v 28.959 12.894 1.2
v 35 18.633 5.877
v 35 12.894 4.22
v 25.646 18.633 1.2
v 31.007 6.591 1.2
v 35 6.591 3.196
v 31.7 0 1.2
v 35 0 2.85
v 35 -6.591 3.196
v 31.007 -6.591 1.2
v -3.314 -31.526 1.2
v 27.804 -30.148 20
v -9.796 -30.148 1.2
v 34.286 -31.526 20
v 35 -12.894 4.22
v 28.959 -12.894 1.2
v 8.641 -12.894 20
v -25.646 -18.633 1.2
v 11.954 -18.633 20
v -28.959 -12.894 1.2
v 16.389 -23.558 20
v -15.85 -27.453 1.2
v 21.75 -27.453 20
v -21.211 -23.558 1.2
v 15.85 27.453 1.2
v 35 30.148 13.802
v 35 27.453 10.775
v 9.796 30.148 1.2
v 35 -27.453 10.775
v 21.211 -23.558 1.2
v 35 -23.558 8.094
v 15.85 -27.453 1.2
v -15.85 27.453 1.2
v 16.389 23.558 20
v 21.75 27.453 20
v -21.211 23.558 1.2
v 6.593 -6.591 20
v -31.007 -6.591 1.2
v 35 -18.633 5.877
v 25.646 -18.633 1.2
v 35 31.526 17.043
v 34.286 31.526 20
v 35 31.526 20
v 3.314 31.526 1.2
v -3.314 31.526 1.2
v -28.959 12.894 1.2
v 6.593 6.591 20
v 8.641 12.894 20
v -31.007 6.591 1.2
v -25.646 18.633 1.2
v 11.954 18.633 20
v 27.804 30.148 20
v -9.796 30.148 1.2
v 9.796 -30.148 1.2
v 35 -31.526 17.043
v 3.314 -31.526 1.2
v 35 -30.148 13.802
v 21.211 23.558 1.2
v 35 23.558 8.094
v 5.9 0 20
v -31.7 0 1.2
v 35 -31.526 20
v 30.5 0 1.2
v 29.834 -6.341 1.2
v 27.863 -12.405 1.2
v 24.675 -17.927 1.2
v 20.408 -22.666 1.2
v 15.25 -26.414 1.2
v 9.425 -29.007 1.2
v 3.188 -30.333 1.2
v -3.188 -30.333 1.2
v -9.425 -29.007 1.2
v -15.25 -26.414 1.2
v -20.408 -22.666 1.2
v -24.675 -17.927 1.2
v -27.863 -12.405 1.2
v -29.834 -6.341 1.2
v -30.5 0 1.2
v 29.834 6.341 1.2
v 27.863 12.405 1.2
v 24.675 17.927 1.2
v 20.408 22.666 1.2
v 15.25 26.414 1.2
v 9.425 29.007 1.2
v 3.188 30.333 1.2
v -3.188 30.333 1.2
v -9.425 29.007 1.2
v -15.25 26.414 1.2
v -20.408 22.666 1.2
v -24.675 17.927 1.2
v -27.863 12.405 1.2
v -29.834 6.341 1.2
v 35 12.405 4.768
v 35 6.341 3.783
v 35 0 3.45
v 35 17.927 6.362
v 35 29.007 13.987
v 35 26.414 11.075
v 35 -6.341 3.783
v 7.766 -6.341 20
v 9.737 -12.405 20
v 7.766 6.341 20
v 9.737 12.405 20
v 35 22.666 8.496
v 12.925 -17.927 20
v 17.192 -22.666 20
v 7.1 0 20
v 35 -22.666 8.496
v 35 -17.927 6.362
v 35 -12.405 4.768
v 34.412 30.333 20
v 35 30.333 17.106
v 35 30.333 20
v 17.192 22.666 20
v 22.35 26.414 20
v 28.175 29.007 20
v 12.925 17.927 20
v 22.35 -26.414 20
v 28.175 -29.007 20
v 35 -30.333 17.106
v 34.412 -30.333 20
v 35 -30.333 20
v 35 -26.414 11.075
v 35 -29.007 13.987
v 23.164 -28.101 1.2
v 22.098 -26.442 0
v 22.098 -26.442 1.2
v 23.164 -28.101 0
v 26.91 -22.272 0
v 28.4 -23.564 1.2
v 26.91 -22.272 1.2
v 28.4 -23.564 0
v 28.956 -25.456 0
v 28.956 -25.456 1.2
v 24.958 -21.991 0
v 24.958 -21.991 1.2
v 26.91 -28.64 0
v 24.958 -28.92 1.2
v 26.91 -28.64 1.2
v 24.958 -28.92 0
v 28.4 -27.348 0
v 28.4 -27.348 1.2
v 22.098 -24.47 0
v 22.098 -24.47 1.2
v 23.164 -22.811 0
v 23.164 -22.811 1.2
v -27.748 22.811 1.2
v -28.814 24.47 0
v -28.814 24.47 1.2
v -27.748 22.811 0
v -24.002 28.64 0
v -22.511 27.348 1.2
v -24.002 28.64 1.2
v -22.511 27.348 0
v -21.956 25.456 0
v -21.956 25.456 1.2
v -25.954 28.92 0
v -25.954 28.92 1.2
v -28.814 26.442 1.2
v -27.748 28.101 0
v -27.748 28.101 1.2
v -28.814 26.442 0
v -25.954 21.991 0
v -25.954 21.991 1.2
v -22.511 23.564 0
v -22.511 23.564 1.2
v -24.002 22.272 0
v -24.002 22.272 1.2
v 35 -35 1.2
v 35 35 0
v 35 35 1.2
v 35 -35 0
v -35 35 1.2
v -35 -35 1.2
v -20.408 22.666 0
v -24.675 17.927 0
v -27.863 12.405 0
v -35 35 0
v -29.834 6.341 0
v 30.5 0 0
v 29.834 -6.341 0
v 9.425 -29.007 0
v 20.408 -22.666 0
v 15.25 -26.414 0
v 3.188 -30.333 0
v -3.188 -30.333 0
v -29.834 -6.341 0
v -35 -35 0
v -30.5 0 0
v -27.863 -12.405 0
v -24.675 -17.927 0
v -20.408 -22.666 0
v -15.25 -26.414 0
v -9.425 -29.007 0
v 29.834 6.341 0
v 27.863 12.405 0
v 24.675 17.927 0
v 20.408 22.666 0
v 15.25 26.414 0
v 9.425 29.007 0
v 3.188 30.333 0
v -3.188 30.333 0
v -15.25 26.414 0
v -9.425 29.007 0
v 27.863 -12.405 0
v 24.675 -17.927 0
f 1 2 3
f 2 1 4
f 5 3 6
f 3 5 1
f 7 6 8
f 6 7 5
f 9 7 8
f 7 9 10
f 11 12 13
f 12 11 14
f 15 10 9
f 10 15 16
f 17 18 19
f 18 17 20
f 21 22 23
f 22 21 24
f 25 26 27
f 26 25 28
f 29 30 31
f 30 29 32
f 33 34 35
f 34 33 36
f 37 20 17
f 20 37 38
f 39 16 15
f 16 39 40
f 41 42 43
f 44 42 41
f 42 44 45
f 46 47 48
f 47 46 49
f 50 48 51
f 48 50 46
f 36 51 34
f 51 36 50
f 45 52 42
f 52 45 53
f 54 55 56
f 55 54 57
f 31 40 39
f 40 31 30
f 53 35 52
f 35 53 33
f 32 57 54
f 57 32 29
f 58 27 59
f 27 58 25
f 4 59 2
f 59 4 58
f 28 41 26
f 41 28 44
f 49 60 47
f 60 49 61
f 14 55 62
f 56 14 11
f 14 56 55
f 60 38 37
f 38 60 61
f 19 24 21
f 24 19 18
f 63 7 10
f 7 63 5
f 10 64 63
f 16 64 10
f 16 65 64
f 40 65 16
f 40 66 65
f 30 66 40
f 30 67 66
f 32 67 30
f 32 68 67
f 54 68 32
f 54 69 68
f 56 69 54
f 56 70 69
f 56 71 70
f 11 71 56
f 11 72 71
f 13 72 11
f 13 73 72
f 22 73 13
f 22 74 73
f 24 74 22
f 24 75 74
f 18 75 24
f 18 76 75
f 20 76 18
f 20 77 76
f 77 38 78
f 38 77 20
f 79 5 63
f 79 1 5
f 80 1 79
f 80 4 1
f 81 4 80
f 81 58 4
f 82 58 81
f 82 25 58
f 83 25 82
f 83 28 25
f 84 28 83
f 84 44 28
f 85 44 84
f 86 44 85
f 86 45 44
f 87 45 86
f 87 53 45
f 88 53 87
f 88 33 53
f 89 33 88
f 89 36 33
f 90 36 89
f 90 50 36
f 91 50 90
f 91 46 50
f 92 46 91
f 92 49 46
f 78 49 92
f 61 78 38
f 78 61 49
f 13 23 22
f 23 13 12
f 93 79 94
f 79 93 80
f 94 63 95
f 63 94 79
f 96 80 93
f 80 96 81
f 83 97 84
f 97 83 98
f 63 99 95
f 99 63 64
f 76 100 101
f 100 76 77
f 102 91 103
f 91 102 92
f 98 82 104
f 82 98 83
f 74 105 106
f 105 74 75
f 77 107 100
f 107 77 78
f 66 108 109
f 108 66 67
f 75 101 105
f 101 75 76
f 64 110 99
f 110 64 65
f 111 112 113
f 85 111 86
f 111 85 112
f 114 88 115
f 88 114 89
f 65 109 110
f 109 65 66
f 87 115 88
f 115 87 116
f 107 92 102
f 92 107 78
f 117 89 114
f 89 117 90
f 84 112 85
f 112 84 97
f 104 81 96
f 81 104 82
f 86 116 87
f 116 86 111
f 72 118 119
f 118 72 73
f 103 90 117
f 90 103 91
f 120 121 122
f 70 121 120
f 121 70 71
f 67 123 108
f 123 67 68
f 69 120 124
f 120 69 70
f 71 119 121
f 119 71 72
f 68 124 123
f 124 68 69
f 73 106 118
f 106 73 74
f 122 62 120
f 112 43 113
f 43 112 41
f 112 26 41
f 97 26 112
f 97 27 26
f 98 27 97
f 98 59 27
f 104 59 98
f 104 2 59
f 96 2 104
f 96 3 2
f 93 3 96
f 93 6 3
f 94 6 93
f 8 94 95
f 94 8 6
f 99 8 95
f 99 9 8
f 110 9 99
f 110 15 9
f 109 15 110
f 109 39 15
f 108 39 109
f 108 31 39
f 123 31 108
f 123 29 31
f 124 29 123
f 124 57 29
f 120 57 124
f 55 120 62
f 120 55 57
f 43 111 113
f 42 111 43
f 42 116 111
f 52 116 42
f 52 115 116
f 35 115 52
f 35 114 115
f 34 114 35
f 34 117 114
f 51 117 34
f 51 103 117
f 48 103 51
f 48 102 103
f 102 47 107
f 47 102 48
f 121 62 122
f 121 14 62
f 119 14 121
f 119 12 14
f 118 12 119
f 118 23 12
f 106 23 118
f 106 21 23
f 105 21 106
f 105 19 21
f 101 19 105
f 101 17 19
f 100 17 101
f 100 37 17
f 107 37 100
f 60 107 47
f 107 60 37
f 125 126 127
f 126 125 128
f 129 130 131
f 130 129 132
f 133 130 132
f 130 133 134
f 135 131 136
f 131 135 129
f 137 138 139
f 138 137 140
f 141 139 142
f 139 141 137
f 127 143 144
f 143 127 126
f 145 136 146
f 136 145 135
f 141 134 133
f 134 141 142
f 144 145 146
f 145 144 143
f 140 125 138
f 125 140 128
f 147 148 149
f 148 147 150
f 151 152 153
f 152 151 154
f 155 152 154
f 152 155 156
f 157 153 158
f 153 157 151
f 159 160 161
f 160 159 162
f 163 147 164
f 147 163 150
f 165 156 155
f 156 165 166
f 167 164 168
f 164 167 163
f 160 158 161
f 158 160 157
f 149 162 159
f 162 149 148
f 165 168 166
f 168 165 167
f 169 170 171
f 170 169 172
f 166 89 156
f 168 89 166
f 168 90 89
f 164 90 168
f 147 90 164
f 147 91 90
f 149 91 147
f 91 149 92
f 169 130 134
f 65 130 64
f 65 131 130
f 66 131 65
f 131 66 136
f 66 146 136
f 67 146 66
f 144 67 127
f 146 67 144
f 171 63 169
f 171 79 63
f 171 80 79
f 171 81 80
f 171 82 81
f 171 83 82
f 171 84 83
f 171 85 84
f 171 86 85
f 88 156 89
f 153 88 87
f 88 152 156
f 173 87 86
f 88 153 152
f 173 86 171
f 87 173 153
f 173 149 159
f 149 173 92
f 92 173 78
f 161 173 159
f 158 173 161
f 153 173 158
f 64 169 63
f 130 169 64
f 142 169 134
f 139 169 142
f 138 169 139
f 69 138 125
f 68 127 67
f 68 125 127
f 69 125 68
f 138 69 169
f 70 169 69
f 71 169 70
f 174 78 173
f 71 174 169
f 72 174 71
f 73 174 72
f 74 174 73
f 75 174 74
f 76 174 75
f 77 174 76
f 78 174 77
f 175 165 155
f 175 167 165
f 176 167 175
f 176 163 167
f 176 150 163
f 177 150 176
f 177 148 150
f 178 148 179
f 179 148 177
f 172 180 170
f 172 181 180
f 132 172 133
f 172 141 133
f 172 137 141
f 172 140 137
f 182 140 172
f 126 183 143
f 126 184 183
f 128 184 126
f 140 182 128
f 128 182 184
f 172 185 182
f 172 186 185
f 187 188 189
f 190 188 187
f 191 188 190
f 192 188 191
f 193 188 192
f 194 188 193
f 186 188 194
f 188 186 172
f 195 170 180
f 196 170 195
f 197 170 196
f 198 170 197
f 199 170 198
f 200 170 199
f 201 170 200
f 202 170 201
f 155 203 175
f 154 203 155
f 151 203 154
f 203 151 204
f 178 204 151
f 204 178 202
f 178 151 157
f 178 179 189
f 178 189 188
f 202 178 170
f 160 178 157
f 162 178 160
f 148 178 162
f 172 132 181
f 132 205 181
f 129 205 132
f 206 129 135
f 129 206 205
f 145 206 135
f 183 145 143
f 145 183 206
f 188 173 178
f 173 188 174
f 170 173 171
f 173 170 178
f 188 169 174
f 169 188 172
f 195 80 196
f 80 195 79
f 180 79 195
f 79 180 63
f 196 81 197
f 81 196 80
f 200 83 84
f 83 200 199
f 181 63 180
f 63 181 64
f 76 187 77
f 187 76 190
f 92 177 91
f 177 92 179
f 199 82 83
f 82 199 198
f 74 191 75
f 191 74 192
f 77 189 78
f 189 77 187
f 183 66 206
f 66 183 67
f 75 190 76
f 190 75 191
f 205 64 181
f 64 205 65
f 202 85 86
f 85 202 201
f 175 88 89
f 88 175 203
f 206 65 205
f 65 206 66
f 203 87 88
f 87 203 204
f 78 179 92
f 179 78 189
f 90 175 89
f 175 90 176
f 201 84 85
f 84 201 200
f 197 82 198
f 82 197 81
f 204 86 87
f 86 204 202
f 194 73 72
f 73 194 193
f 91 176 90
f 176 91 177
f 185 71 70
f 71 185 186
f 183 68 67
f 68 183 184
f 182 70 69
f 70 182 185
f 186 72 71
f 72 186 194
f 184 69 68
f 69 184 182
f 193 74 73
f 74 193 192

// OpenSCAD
DIAMETER_IN = 61;
THICKNESS = 1.2;
SUPPORT_SIZE = 70;

M_DISTANCE = 72;
M_DIAMETER = 7;

RADIUS_IN = DIAMETER_IN / 2;
M_RADIUS = M_DIAMETER / 2;


//translate([0, 0, THICKNESS])
module shearedCylinder(shearingX=0, shearingY=0) {
    M = [[1, 0, shearingX, 0],
         [0, 1, shearingY, 0],
         [0, 0, 1, 0],
         [0, 0, 0, 1]];
    
    multmatrix(M) {
        difference() {
            cylinder(r=RADIUS_IN + THICKNESS, h=40, center=false);
            translate([0, 0, -1])
            cylinder(r=RADIUS_IN, h=42, center=false);
        }
    }
}

module main() {
    difference() {
        translate([0, 0, THICKNESS])
        shearedCylinder(2);
        translate([SUPPORT_SIZE/2, -SUPPORT_SIZE/2, 0])
        cube([SUPPORT_SIZE*2, SUPPORT_SIZE, 50], center=false);
        
        translate([-SUPPORT_SIZE/2, -SUPPORT_SIZE/2, 20])
        cube([SUPPORT_SIZE*2, SUPPORT_SIZE*2, SUPPORT_SIZE], center=false);
    }
}

module bolt_hole() {
    translate([0, 0, -1])
        cylinder(r=M_RADIUS, h=THICKNESS+2, center=false);
    
    
}

module bolt_holes() {
    m = M_DISTANCE / 2;
    shift = sqrt(m * m / 2);
    
    translate([shift, -shift, 0]) bolt_hole();
    translate([-shift, shift, 0]) bolt_hole();
}

module support() {
    difference() {
        translate([-SUPPORT_SIZE/2, -SUPPORT_SIZE/2, 0])
        cube([SUPPORT_SIZE, SUPPORT_SIZE, THICKNESS], center=false);
        translate([0, 0, -1])
        cylinder(r=RADIUS_IN, h=THICKNESS+2, center=false);
        bolt_holes();
    }
}

union() {
    main();
    support();
}
